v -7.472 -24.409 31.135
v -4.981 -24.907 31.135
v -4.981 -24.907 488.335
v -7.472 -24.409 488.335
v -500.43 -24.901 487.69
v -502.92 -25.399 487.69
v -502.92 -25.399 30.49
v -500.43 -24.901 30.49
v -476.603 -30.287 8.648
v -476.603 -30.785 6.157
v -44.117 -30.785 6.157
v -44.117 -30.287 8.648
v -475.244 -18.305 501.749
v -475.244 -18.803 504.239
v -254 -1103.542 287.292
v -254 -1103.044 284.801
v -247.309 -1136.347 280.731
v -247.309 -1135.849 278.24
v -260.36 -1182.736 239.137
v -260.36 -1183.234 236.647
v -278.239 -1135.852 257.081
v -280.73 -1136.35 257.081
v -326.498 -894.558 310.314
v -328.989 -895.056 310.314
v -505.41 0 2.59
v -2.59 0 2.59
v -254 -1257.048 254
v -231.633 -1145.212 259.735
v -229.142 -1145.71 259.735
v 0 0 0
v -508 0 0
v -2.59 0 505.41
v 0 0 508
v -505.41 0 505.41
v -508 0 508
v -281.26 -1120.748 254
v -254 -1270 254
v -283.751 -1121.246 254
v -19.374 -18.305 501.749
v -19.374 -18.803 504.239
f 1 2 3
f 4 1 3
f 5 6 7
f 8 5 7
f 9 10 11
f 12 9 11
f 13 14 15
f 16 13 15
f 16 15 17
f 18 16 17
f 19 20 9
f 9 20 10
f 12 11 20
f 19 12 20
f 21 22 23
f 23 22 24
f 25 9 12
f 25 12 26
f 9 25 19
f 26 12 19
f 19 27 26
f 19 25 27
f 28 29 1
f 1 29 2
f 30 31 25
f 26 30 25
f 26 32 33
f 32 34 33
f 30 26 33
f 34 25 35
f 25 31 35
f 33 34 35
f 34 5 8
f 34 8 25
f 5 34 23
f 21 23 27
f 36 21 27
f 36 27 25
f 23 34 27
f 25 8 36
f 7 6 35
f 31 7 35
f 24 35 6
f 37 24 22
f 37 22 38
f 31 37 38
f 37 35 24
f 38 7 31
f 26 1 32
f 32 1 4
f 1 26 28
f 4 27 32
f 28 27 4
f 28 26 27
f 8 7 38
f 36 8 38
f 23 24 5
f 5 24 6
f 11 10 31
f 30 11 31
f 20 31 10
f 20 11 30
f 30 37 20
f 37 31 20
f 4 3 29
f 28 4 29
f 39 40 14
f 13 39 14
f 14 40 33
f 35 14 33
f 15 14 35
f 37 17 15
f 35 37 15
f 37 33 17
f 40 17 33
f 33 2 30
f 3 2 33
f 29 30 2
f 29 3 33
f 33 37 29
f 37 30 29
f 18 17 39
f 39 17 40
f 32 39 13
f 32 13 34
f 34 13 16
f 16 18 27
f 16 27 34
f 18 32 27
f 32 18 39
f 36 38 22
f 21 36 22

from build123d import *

# Parameters (mm, degrees)
F0_W      = 508
F0_H      = 508
F4_T      = -2.54
F7_DEPTH  = 25.4
F10_DEPTH = 25.4
F13_DEPTH = 25.4
F16_DEPTH = 25.4


with BuildPart() as f3:
    # F0 (on Front) → F3 section 0
    with BuildSketch(Plane.XZ, mode=Mode.PRIVATE) as f3_s0:
        with Locations((-254, 254)):
            Rectangle(F0_W, F0_H)
    loft([f3_s0.sketch, Vertex(-254, -1270, 254)])

    # F4
    f4_openings = [f3.faces().sort_by_distance(p)[0] for p in [
        (-254, 0, 254),
    ]]
    offset(amount=F4_T, openings=f4_openings)

    # F6 (on offset) → F7 (cut)
    with BuildSketch(Plane(origin=(0, 0, 0), x_dir=(0.1961161351, 0.9805806757, 0), z_dir=(0.9805806757, -0.1961161351, 0))):
        Polygon((-25.4, 31.1354669124), (-25.4, 488.3354669124), (-1168.4, 259.7354669124), align=None)
    extrude(amount=-F7_DEPTH, mode=Mode.SUBTRACT)

    # F9 (on offset) → F10 (cut)
    with BuildSketch(Plane(origin=(-488.4615384615, -97.6923076923, 0), x_dir=(0.1961161351, -0.9805806757, 0), z_dir=(-0.9805806757, -0.1961161351, 0))):
        Polygon((813.1548545488, 310.3141247361), (-73.7252337318, 487.6901423922), (-73.7252337318, 254), (1043.8240543072, 254), (1059.226906247, 257.080570388), align=None)
        Polygon((1043.8240543072, 254), (-73.7252337318, 254), (-73.7252337318, 30.4901423922), align=None)
    extrude(amount=-F10_DEPTH, mode=Mode.SUBTRACT)

    # F12 (on offset) → F13 (cut)
    with BuildSketch(Plane(origin=(0, -97.6923076923, 488.4615384615), x_dir=(1, 0, 0), z_dir=(0, -0.1961161351, 0.9805806757))):
        Polygon((-247.3090775045, -1059.2242055456), (-19.3738871979, 80.4517459869), (-254, 80.4517459869), (-254, -1025.7695930679), align=None)
        Polygon((-254, 80.4517459869), (-475.244267811, 80.4517459869), (-254, -1025.7695930679), align=None)
    extrude(amount=-F13_DEPTH, mode=Mode.SUBTRACT)

    # F15 (on offset) → F16 (cut)
    with BuildSketch(Plane(origin=(0, 0, 0), x_dir=(1, 0, 0), z_dir=(0, -0.1961161351, -0.9805806757))):
        Polygon((-44.116795063, 31.3945114613), (-260.3600621223, 1206.6667079926), (-476.6033291817, 31.3945114613), align=None)
    extrude(amount=-F16_DEPTH, mode=Mode.SUBTRACT)


solid = f3.part
